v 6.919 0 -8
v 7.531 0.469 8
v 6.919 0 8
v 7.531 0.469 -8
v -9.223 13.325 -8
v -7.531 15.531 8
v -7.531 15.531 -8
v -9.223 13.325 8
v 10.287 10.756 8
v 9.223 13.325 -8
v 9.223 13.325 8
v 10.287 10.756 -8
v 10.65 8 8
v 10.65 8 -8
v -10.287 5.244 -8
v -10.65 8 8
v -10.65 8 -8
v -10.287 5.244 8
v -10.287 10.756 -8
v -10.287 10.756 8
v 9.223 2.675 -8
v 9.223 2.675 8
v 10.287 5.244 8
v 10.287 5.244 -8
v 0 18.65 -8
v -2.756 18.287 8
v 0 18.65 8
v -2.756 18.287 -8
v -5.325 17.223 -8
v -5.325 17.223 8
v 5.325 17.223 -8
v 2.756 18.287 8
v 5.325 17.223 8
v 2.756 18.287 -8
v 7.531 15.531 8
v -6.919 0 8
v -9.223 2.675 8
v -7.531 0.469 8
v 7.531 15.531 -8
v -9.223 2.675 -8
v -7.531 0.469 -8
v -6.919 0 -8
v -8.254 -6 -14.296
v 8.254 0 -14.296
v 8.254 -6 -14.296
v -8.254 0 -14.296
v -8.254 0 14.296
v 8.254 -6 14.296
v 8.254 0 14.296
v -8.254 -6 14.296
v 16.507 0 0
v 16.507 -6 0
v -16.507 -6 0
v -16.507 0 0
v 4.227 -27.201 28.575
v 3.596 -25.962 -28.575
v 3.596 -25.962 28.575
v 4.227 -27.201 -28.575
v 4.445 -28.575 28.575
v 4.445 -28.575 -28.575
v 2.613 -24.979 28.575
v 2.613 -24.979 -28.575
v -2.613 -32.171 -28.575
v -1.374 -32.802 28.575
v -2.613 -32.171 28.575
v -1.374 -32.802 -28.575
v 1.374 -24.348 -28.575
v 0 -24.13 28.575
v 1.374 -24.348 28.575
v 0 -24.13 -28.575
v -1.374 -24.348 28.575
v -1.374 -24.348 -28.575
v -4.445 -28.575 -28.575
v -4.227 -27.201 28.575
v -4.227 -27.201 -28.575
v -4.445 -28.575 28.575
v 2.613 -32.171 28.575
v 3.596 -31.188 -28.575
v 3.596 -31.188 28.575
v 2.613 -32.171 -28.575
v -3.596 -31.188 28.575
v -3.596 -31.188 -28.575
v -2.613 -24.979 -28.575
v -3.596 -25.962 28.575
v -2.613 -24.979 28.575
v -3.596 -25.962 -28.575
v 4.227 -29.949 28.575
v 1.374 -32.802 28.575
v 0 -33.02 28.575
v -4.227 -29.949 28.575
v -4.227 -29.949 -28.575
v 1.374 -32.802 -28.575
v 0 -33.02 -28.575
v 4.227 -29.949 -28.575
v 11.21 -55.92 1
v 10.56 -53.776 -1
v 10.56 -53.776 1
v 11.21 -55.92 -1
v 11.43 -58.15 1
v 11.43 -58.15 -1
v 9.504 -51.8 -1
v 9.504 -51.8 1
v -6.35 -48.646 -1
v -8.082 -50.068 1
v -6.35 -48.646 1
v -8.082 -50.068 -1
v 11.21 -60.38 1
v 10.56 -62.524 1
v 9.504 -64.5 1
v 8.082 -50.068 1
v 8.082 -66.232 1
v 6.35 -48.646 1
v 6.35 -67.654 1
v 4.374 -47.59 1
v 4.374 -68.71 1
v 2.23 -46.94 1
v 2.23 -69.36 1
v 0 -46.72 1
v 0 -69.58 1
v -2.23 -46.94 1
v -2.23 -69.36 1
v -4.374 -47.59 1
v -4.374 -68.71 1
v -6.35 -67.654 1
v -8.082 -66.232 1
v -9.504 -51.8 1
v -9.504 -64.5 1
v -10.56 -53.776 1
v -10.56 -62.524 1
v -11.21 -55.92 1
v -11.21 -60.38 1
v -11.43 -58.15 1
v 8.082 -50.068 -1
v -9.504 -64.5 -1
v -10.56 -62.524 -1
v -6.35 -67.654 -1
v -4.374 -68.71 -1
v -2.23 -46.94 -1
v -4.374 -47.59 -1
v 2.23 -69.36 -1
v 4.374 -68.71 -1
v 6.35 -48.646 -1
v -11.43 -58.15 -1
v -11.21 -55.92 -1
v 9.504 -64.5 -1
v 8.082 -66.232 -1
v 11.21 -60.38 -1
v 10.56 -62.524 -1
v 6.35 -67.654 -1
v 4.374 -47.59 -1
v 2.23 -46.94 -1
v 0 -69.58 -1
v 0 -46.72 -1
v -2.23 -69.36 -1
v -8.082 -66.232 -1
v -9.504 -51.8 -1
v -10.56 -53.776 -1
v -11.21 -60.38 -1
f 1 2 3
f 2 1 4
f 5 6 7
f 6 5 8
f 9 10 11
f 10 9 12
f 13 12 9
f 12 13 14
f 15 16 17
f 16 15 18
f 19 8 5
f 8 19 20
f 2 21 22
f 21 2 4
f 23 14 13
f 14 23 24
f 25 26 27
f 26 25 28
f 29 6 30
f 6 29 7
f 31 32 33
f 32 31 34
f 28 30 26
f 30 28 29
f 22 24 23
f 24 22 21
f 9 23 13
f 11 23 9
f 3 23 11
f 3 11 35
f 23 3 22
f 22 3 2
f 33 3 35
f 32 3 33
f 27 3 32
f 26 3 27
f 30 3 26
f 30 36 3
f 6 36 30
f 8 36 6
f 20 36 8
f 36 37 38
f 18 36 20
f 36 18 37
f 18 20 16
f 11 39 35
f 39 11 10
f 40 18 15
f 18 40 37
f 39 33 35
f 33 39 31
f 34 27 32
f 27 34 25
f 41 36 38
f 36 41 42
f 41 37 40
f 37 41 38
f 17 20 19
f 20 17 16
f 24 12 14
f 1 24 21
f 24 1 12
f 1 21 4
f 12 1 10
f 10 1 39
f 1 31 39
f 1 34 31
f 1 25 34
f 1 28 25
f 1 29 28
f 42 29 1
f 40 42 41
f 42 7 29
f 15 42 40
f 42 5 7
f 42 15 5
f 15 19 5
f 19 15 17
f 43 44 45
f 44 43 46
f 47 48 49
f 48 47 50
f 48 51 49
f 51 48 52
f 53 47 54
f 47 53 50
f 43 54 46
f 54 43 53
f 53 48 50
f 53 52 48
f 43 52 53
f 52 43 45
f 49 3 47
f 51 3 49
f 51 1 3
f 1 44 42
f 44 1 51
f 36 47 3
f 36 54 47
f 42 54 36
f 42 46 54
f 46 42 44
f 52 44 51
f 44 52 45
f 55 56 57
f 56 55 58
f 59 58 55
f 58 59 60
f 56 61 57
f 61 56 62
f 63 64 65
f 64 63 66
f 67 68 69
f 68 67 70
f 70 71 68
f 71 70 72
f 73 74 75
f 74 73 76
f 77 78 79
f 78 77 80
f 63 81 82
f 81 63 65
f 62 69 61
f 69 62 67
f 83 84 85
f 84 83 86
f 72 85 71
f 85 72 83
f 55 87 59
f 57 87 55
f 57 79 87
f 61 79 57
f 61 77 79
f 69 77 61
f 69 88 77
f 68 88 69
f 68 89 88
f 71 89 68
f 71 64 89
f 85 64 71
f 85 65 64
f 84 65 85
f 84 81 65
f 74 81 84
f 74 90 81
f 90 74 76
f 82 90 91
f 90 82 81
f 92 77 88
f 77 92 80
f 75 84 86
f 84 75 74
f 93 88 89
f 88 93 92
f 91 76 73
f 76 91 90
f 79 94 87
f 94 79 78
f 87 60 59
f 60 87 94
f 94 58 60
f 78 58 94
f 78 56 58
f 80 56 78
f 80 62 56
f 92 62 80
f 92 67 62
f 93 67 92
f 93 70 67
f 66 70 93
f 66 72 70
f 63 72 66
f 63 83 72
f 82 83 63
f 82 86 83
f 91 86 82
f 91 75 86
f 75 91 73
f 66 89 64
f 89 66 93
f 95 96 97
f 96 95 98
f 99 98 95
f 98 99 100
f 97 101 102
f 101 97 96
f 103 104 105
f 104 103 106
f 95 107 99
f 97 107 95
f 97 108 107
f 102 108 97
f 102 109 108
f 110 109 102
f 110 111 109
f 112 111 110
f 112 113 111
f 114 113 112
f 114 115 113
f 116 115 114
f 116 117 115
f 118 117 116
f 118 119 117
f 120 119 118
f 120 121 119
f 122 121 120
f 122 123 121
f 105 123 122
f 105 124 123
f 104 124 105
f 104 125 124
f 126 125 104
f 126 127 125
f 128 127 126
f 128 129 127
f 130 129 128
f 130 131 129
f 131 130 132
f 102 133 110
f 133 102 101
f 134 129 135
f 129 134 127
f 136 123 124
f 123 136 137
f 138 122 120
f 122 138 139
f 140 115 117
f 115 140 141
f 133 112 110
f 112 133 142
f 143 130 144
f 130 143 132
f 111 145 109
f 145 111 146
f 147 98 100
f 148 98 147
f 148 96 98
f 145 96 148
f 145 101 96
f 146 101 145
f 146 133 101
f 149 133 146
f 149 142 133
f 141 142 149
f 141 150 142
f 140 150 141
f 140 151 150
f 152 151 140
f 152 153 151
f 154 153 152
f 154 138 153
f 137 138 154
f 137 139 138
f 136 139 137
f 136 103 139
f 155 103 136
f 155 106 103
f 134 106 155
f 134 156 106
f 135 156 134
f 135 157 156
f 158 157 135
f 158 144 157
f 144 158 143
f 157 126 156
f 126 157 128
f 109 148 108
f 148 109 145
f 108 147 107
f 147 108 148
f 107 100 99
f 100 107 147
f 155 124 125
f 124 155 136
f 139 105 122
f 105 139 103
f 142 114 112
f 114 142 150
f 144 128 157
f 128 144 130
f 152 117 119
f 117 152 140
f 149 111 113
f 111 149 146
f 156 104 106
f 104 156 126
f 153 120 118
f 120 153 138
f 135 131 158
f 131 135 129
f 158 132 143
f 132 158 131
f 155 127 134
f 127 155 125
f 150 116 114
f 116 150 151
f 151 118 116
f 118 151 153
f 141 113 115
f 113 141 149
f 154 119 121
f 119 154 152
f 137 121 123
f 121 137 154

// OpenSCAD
// Auto-generated by scripts/author_from_manifest.py (Phase D.3).
// Source: data/phase_d_manifest.json (sku_intent='senju-znqr-pendent-155f').
// Do not hand-edit — regenerate from the manifest.
//
// @part senju_znqr_pendent_155f
// @kind sprinkler_head
// @category head.pendant.k56
// @display-name "Senju ZN-QR Quick Response Pendent K5.6 155°F"
// @mfg senju_sprinkler
// @mfg-pn ZN-QR
// @listing UL FM
// @hazard-classes LH OH1
// @price-usd 13.40
// @install-minutes 8
// @crew journeyman
// @k-factor 5.6
// @orientation pendant
// @response quick
// @temperature 155F
// @param size_in number default=0.5 label="Size" unit="in"
// @port inlet position=[0,0.014,0] direction=[0,1,0] style=NPT_threaded size_in=0.5 role=drop

size_in = 0.5;
k_factor = 5.6;

length_mm   = 57.15;
body_dia_mm = 25.40;
thread_od   = 21.3;
thread_len  = 16;
deflector_d = body_dia_mm * 0.9;

 union() {
    translate([0, thread_len/2, 0])
        cylinder(h = thread_len, d = thread_od, center = true, $fn = 24);
    translate([0, -3, 0])
        rotate([90, 0, 0])
        cylinder(h = 6, d = thread_od * 1.55, $fn = 6, center = true);
    translate([0, -length_mm/2, 0])
        cylinder(h = length_mm, d = body_dia_mm * 0.35, center = true, $fn = 20);
    translate([0, -length_mm - 1, 0])
        cylinder(h = 2, d = deflector_d, center = true, $fn = 32);
}
